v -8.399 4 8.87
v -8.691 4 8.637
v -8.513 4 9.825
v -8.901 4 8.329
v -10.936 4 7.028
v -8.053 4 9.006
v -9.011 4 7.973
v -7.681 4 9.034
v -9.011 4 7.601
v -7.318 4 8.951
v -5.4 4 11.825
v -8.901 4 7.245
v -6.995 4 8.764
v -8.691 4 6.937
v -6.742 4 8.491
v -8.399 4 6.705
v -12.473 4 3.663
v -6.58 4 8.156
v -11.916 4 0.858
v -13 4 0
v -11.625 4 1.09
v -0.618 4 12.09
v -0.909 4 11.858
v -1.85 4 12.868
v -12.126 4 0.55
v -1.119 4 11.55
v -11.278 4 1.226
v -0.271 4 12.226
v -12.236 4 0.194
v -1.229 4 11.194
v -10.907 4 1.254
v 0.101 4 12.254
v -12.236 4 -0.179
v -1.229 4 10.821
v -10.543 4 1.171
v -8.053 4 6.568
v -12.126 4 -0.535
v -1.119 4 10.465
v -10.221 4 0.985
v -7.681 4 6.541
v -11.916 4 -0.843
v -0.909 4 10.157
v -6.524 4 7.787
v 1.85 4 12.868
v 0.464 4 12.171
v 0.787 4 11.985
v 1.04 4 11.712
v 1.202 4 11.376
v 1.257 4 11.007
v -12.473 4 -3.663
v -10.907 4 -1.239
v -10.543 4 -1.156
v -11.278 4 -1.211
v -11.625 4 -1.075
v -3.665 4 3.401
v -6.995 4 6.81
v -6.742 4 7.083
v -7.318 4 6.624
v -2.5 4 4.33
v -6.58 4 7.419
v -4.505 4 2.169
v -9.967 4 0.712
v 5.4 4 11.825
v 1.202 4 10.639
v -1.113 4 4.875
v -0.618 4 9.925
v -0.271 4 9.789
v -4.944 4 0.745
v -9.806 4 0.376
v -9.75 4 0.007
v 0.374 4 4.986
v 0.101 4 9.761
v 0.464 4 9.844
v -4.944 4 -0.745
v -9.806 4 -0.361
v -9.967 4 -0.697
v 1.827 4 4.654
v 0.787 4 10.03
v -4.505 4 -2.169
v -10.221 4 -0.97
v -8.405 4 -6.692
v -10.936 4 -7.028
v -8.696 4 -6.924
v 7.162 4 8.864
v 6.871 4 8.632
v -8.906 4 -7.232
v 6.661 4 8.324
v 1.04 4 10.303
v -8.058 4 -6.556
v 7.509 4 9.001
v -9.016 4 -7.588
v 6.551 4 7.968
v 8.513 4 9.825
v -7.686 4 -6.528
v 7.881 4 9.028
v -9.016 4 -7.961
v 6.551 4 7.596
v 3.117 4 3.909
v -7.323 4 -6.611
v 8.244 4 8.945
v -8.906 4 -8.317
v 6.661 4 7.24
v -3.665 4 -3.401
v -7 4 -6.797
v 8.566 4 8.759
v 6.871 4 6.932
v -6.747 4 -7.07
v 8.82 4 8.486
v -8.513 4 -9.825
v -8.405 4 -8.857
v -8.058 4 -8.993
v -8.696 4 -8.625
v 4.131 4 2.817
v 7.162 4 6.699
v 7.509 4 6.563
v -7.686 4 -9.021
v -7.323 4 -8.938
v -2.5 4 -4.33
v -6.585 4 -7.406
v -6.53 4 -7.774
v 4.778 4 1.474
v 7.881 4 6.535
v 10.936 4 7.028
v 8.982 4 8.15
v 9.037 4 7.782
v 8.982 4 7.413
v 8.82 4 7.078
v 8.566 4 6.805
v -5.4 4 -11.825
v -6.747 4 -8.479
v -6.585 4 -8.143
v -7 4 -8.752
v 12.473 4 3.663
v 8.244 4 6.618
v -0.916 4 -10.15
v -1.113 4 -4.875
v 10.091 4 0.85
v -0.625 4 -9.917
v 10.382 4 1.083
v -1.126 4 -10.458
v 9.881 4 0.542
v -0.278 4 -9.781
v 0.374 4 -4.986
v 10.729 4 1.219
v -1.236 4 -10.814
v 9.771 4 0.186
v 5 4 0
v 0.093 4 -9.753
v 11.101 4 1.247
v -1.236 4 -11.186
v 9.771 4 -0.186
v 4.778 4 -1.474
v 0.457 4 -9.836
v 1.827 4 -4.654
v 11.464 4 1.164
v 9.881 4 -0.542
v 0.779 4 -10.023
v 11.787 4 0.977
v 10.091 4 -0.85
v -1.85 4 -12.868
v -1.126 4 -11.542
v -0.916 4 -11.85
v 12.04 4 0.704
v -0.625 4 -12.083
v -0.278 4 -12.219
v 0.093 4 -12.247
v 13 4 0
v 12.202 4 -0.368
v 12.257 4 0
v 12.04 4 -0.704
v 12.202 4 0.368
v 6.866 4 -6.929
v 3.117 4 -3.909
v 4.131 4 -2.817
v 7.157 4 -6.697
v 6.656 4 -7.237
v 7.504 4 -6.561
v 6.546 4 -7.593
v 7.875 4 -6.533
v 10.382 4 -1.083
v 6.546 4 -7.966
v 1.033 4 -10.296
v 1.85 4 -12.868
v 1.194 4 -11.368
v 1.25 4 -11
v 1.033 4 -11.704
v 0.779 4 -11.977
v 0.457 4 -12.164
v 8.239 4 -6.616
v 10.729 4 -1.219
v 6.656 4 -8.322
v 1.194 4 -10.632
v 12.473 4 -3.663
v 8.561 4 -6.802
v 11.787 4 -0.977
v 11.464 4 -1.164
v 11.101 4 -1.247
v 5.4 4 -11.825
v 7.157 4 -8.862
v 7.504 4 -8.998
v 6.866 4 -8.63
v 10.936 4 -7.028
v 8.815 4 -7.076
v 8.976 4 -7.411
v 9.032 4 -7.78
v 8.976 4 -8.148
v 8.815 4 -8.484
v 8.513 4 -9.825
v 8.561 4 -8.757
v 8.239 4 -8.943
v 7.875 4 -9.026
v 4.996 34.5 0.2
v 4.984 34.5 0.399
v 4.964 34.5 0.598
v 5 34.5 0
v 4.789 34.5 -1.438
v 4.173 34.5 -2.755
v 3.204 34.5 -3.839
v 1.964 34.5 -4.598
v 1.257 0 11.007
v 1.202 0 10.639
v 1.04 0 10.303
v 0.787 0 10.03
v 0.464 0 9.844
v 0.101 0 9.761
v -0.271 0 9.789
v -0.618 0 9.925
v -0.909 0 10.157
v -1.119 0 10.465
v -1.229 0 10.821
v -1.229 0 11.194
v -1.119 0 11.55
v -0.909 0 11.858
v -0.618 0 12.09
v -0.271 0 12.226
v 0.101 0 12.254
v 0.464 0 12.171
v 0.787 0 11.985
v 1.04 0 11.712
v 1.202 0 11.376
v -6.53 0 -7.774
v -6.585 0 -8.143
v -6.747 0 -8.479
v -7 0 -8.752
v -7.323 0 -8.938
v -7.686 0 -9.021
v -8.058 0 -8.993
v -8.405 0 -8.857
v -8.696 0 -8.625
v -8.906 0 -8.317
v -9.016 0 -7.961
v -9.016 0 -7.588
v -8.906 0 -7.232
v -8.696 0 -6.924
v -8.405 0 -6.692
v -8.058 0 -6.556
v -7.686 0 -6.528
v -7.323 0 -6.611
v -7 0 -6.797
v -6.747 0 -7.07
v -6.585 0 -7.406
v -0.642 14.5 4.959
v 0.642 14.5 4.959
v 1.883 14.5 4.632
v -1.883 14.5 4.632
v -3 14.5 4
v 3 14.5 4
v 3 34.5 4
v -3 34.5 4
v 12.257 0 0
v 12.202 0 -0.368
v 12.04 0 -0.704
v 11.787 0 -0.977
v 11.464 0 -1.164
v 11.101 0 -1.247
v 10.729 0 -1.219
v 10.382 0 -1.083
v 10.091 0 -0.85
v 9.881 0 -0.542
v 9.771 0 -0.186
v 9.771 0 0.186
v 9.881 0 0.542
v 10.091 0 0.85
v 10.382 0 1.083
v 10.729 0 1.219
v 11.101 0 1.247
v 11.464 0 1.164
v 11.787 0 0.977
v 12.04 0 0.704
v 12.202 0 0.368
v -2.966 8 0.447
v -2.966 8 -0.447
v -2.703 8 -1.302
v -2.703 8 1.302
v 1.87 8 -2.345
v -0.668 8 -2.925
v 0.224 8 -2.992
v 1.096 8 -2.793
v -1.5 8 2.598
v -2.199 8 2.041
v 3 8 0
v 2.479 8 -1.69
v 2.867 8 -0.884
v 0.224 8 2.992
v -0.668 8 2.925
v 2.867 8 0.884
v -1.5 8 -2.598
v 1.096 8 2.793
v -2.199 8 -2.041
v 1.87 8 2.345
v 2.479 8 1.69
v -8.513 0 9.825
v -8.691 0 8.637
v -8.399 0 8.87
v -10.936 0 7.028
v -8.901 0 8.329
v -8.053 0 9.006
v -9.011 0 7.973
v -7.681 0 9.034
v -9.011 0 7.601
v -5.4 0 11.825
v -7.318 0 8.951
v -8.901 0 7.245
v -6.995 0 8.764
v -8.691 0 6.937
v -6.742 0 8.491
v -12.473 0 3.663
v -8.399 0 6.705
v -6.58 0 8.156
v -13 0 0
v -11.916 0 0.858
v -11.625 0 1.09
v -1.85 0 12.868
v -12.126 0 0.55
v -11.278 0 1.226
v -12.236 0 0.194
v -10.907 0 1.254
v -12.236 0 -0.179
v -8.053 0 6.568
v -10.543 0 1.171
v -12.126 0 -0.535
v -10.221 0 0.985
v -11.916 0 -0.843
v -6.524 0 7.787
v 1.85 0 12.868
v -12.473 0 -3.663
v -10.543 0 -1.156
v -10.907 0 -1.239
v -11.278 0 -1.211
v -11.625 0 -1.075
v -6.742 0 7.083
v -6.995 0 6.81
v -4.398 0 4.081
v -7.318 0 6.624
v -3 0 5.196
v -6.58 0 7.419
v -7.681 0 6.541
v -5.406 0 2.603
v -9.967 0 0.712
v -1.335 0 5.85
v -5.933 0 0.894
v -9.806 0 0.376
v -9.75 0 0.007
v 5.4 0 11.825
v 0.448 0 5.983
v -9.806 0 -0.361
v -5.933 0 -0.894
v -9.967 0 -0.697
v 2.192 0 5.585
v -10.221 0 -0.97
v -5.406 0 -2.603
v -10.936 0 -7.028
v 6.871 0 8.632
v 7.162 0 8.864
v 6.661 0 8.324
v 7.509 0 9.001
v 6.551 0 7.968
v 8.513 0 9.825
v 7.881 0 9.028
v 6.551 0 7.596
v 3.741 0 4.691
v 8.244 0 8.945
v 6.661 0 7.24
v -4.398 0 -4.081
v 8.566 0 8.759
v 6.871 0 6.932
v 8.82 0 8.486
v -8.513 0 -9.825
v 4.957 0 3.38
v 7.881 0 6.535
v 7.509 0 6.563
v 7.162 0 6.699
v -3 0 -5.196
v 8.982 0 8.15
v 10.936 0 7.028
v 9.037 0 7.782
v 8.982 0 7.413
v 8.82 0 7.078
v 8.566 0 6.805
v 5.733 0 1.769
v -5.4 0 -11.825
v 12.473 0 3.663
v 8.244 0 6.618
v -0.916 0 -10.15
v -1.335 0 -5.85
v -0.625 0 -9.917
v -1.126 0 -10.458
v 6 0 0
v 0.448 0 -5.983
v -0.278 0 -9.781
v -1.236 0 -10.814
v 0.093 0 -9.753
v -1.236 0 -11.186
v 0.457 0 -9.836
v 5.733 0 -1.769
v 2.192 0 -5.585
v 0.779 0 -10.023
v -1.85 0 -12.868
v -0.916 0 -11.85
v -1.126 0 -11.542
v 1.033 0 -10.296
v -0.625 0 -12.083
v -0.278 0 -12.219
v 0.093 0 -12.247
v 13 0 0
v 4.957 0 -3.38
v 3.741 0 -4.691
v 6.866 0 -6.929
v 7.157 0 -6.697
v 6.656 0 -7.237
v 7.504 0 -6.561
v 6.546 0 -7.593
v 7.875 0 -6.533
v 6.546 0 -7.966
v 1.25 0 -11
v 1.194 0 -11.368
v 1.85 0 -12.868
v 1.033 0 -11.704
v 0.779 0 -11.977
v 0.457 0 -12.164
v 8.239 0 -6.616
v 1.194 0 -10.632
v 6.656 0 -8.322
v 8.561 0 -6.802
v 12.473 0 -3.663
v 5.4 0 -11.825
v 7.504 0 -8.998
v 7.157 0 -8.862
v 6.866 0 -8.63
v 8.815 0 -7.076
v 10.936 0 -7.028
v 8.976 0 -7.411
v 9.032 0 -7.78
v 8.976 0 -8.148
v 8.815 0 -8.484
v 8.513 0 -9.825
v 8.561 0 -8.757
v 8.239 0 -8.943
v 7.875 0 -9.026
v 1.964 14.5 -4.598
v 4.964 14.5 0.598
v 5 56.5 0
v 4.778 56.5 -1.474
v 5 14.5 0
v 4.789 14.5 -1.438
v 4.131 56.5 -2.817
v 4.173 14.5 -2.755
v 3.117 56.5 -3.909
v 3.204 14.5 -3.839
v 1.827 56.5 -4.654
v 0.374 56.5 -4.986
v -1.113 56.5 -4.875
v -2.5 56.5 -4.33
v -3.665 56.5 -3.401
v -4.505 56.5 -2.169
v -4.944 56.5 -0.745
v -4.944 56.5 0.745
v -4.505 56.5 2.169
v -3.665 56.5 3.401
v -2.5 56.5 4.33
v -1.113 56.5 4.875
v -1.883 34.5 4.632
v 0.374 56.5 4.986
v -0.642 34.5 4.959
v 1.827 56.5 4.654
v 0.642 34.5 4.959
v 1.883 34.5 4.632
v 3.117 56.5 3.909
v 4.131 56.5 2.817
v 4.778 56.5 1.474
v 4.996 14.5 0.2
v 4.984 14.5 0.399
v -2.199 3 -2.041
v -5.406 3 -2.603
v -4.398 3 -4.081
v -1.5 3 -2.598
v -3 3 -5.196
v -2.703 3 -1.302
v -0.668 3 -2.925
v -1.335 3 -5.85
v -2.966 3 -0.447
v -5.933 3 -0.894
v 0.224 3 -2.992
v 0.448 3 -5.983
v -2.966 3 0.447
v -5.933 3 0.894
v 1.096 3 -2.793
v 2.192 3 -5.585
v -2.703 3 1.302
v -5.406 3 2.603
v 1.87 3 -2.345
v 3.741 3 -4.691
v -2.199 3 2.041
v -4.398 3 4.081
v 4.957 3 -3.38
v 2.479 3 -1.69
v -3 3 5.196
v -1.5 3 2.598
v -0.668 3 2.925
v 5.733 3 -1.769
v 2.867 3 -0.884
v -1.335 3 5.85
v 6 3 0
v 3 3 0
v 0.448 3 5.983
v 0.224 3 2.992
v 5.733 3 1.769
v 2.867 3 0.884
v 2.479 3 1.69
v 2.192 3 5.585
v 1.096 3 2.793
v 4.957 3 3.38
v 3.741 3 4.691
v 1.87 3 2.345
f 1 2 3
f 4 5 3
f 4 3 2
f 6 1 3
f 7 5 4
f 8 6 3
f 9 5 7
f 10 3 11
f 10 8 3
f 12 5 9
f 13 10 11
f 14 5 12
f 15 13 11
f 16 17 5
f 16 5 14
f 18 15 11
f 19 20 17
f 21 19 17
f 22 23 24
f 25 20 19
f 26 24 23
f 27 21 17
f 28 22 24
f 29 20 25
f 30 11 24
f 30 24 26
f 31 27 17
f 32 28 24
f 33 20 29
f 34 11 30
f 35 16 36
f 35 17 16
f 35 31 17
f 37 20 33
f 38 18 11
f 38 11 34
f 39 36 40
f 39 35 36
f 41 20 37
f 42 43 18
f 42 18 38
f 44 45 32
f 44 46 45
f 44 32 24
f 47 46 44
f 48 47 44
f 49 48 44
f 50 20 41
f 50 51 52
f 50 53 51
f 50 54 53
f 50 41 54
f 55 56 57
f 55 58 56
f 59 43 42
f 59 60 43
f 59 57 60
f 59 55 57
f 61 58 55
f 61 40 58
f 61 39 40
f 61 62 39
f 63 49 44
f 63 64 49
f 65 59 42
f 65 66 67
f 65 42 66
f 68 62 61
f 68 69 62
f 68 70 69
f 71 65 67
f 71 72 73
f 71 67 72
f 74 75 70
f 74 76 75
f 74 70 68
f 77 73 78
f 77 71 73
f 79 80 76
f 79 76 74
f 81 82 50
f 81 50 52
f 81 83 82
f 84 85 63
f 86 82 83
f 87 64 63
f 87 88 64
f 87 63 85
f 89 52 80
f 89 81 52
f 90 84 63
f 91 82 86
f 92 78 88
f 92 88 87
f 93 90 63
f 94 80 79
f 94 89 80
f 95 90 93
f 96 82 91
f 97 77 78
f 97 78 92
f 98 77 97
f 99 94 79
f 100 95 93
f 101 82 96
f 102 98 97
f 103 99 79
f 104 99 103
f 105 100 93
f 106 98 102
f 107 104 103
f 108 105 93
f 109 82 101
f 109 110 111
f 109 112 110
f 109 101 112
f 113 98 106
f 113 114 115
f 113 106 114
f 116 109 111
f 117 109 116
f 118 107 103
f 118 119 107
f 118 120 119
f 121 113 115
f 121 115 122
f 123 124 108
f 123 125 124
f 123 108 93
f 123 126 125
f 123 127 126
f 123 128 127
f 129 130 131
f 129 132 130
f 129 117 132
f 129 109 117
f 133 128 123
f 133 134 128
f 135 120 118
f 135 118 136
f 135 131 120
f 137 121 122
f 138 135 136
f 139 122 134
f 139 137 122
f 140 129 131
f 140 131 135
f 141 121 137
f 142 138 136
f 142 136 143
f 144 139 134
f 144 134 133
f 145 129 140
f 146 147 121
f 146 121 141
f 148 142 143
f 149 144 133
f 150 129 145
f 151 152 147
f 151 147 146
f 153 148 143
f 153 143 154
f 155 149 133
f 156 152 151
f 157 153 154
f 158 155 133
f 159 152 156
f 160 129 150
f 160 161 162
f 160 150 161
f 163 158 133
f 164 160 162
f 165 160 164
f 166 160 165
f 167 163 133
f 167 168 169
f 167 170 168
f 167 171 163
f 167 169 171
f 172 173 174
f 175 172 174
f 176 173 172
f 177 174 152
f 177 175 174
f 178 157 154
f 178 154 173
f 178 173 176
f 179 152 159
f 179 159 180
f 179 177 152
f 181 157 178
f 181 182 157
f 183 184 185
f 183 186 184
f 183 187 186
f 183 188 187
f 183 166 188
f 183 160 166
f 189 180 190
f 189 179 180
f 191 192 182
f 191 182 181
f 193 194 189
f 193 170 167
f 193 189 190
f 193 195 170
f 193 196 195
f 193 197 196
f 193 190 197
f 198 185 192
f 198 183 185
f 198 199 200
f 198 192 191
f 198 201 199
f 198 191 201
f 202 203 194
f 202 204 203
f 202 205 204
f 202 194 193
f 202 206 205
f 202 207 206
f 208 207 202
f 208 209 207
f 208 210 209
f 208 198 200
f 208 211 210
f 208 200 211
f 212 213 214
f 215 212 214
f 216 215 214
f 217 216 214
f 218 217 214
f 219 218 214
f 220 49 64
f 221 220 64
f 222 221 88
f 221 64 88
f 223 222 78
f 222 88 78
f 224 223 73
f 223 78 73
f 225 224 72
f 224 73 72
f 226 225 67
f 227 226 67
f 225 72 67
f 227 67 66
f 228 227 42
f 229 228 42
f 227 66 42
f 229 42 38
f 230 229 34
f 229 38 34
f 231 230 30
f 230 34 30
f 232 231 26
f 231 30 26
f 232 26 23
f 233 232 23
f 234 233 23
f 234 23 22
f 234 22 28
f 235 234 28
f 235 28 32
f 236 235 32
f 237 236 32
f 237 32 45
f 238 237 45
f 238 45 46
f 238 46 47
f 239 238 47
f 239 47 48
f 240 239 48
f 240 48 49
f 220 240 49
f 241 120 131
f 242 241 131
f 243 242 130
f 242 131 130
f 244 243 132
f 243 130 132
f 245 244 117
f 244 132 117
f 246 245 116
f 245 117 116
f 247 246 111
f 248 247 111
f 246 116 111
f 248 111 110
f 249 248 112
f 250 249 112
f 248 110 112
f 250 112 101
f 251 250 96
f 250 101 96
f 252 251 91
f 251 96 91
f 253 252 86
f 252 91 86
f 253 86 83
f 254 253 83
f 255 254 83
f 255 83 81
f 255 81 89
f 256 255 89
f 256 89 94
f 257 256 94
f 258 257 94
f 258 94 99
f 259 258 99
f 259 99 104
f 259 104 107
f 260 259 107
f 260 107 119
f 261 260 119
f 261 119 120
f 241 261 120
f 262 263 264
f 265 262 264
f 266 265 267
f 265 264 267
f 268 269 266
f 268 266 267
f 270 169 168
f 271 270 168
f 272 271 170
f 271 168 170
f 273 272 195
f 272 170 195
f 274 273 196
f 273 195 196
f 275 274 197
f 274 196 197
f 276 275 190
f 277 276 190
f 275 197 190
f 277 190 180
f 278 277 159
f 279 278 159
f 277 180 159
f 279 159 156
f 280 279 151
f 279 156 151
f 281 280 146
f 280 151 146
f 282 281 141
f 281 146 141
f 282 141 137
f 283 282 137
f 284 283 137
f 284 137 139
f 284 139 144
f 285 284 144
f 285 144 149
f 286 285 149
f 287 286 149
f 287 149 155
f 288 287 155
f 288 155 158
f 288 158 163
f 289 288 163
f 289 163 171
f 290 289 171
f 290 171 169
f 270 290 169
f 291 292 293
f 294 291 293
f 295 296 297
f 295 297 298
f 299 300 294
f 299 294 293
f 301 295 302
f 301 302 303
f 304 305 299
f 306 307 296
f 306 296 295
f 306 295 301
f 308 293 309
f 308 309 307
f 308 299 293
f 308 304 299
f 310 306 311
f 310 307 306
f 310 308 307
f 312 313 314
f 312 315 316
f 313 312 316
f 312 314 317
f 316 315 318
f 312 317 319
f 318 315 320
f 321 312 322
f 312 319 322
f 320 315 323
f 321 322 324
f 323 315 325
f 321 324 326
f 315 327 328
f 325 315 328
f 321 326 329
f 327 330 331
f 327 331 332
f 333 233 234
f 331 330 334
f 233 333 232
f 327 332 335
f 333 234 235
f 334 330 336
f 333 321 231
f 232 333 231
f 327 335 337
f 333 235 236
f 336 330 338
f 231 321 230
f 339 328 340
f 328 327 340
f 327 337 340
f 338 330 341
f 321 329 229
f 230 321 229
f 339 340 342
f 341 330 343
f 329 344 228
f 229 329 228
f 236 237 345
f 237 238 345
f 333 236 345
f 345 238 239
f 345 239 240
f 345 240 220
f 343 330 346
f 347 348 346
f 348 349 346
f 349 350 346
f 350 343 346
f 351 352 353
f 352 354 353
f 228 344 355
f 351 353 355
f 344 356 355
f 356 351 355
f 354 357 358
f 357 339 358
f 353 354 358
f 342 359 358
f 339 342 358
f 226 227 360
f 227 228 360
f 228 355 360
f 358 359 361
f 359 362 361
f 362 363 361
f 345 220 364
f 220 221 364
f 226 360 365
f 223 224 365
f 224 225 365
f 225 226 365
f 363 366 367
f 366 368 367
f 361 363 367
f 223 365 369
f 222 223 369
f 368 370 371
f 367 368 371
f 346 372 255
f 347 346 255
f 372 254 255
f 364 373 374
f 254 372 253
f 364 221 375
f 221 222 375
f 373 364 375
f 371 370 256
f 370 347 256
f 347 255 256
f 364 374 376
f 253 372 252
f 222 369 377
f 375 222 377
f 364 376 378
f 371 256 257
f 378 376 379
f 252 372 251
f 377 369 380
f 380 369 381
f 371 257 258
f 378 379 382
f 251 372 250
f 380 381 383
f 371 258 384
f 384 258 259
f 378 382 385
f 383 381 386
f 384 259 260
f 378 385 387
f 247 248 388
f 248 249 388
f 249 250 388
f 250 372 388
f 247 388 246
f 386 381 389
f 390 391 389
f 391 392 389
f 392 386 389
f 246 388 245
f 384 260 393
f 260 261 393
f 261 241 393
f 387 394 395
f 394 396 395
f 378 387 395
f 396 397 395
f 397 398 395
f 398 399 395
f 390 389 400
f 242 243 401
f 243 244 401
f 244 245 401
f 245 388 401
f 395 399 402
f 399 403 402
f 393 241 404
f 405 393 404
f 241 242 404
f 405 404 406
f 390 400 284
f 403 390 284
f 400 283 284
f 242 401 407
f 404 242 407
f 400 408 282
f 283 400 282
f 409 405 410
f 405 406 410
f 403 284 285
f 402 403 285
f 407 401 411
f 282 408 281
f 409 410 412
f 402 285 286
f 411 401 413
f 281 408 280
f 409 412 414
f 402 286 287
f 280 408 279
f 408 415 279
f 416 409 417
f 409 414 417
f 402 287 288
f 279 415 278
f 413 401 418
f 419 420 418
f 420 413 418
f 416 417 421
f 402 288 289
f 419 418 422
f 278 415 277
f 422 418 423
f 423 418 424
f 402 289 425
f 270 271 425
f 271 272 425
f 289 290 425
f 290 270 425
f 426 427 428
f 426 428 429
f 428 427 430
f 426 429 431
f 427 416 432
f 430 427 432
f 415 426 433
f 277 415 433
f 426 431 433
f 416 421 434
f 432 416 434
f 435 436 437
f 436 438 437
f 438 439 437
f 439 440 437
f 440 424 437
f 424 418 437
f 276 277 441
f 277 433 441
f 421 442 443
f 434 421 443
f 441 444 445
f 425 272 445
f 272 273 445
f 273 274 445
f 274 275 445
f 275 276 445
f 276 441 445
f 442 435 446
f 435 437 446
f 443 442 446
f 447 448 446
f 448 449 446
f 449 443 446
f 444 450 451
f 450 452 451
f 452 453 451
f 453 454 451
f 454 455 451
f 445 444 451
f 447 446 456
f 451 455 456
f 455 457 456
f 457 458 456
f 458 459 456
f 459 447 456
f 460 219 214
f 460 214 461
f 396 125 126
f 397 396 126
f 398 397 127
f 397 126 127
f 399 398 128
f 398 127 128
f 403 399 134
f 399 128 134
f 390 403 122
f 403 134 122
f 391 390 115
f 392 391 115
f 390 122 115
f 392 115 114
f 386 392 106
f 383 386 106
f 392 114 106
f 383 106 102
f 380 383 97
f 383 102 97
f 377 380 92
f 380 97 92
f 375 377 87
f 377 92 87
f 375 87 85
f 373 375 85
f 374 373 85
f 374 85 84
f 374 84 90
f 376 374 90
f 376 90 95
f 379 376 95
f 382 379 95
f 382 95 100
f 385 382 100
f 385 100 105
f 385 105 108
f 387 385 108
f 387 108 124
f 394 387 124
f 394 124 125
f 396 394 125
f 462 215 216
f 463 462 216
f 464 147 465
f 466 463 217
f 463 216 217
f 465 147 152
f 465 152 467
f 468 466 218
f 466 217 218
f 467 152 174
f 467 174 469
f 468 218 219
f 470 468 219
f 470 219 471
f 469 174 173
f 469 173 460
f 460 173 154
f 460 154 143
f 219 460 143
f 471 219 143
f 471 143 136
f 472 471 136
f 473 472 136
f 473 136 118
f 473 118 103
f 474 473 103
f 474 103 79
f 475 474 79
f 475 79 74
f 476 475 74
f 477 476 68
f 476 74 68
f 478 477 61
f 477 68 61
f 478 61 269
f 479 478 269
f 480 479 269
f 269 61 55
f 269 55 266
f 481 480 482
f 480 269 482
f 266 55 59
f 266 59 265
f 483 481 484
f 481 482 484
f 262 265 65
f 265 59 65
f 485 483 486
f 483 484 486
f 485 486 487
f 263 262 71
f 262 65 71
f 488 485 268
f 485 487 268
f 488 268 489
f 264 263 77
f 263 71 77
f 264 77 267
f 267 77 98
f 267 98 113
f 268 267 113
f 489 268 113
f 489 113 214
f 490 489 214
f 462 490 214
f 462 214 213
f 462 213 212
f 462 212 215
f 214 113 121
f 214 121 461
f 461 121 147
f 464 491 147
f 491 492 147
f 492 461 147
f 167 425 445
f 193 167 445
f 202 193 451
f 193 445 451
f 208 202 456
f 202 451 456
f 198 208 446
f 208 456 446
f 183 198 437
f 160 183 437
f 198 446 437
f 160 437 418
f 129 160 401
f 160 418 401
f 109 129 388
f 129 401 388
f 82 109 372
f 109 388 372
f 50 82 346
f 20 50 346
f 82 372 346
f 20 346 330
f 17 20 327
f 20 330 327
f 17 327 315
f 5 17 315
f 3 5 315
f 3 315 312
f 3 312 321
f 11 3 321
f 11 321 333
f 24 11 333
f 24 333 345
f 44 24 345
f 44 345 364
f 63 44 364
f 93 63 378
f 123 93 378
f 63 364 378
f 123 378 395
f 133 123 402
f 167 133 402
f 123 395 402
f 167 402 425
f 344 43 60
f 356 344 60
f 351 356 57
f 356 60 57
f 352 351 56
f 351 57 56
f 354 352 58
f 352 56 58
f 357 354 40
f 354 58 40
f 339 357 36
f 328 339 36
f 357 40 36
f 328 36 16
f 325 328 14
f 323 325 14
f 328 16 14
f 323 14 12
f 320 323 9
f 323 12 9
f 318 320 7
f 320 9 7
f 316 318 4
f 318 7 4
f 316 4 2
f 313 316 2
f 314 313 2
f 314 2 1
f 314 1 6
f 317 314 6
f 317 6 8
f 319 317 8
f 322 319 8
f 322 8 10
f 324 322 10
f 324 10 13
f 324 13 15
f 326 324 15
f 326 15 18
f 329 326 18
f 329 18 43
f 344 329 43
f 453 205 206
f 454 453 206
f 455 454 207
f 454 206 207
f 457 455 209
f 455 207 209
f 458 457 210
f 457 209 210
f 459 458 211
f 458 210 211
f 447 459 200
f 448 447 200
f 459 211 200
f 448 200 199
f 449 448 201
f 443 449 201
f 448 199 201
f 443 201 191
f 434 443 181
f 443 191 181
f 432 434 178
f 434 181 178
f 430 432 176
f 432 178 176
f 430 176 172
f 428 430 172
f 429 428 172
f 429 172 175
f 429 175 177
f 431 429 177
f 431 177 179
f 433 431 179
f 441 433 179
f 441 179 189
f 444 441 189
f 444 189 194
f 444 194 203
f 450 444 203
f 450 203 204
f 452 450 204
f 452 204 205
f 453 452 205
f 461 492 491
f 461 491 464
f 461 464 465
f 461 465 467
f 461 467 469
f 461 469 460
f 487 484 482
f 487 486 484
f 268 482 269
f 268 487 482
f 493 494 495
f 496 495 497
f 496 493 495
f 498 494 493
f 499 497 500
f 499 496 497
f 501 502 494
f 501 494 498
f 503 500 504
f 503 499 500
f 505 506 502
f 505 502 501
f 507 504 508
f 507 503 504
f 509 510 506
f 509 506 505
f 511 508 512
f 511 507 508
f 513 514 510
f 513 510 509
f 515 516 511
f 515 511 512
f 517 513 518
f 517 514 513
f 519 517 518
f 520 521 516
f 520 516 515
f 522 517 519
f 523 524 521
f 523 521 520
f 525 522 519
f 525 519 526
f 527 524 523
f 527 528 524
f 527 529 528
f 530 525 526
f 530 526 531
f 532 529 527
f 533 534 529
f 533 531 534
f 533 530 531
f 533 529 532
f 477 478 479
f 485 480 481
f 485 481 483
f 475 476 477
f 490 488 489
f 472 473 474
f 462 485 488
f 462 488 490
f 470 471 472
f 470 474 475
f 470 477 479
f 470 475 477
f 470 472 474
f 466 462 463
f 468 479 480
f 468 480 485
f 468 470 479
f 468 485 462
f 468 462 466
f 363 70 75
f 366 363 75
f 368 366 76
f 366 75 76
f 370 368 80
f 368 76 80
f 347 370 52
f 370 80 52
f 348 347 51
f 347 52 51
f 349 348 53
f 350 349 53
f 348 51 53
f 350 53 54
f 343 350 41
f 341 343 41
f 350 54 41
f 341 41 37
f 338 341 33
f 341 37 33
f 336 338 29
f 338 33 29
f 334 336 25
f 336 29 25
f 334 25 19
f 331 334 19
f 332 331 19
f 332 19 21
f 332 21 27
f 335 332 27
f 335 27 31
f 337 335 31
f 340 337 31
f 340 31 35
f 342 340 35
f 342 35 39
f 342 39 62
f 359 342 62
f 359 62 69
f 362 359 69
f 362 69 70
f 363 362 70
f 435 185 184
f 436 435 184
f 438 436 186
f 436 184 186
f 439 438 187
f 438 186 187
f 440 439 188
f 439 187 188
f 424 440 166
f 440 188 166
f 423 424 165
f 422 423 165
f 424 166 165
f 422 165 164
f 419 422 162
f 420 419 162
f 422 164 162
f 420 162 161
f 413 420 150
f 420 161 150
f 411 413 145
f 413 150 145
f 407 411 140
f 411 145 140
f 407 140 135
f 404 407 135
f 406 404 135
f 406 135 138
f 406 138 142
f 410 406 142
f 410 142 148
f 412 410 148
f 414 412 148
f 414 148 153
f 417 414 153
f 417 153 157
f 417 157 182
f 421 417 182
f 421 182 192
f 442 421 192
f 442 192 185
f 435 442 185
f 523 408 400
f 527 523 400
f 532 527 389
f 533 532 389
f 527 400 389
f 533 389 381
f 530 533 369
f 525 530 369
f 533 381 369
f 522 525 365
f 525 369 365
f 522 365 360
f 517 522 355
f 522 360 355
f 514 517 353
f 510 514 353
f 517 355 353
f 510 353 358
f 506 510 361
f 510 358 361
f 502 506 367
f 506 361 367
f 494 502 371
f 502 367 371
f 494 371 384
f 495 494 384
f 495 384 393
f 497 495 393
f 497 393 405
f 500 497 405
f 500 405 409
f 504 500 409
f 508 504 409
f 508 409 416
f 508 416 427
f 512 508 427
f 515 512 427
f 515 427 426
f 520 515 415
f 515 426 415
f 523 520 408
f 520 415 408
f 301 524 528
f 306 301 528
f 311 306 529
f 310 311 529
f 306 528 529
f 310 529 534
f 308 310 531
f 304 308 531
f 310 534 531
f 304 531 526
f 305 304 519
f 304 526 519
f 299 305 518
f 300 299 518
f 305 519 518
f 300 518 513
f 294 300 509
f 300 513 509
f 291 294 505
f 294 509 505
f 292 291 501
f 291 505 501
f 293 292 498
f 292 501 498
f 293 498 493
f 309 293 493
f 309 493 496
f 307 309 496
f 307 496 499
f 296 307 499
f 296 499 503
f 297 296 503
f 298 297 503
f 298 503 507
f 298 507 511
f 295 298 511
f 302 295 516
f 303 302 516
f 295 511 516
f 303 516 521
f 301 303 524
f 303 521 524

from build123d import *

# Parameters (mm, degrees)
SKETCH_1_R          = 13
EXTRUDE_1_DEPTH     = 4
SKETCH_2_R          = 5
EXTRUDE_2_DEPTH     = 52.5
CUT_EXTRUDE_1_REACH = 6
SKETCH_3_R          = 1.25
SKETCH_4_W          = 6
SKETCH_4_H          = 20
CUT_EXTRUDE_2_DEPTH = 1
SKETCH_5_W          = 20
SKETCH_5_H          = 6
CUT_EXTRUDE_3_DEPTH = 1
SKETCH_6_R          = 6
CUT_EXTRUDE_5_DEPTH = 3
SKETCH_7_R          = 3
CUT_EXTRUDE_6_DEPTH = 5


with BuildPart() as part:
    # 스케치1 → 보스-돌출1 (new body)
    with BuildSketch(Plane(origin=(0, 0, 0), x_dir=(1, 0, 0), z_dir=(0, 1, 0))):
        Circle(SKETCH_1_R)
    extrude(amount=EXTRUDE_1_DEPTH)

    # 스케치2 → 보스-돌출2 (add)
    with BuildSketch(Plane(origin=(0, 4, 0), x_dir=(1, 0, 0), z_dir=(0, 1, 0))):
        Circle(SKETCH_2_R)
    extrude(amount=EXTRUDE_2_DEPTH)

    # 스케치3 → 컷-돌출1 (cut, up to next)
    with BuildSketch(Plane(origin=(0, 4, 0), x_dir=(1, 0, 0), z_dir=(0, 1, 0)), mode=Mode.PRIVATE) as cut_extrude_1_sk1:
        with Locations((0, 11)):
            Circle(SKETCH_3_R)
    cut_extrude_1_tool1 = extrude(cut_extrude_1_sk1.sketch, amount=-CUT_EXTRUDE_1_REACH, mode=Mode.PRIVATE) & part.part
    add(cut_extrude_1_tool1.solids().sort_by_distance((0, 4, -11))[0], mode=Mode.SUBTRACT)
    # 스케치3 → 컷-돌출1 (cut, up to next)
    with BuildSketch(Plane(origin=(0, 4, 0), x_dir=(1, 0, 0), z_dir=(0, 1, 0)), mode=Mode.PRIVATE) as cut_extrude_1_sk2:
        with Locations((7.781876099, 7.779707807)):
            Circle(SKETCH_3_R)
    cut_extrude_1_tool2 = extrude(cut_extrude_1_sk2.sketch, amount=-CUT_EXTRUDE_1_REACH, mode=Mode.PRIVATE) & part.part
    add(cut_extrude_1_tool2.solids().sort_by_distance((7.781876, 4, -7.779708))[0], mode=Mode.SUBTRACT)
    # 스케치3 → 컷-돌출1 (cut, up to next)
    with BuildSketch(Plane(origin=(0, 4, 0), x_dir=(1, 0, 0), z_dir=(0, 1, 0)), mode=Mode.PRIVATE) as cut_extrude_1_sk3:
        with Locations((11.007403012, 0)):
            Circle(SKETCH_3_R)
    cut_extrude_1_tool3 = extrude(cut_extrude_1_sk3.sketch, amount=-CUT_EXTRUDE_1_REACH, mode=Mode.PRIVATE) & part.part
    add(cut_extrude_1_tool3.solids().sort_by_distance((11.007403, 4, 0))[0], mode=Mode.SUBTRACT)
    # 스케치3 → 컷-돌출1 (cut, up to next)
    with BuildSketch(Plane(origin=(0, 4, 0), x_dir=(1, 0, 0), z_dir=(0, 1, 0)), mode=Mode.PRIVATE) as cut_extrude_1_sk4:
        with Locations((7.787110819, -7.781876099)):
            Circle(SKETCH_3_R)
    cut_extrude_1_tool4 = extrude(cut_extrude_1_sk4.sketch, amount=-CUT_EXTRUDE_1_REACH, mode=Mode.PRIVATE) & part.part
    add(cut_extrude_1_tool4.solids().sort_by_distance((7.787111, 4, 7.781876))[0], mode=Mode.SUBTRACT)
    # 스케치3 → 컷-돌출1 (cut, up to next)
    with BuildSketch(Plane(origin=(0, 4, 0), x_dir=(1, 0, 0), z_dir=(0, 1, 0)), mode=Mode.PRIVATE) as cut_extrude_1_sk5:
        with Locations((0.007403012, -11.007403012)):
            Circle(SKETCH_3_R)
    cut_extrude_1_tool5 = extrude(cut_extrude_1_sk5.sketch, amount=-CUT_EXTRUDE_1_REACH, mode=Mode.PRIVATE) & part.part
    add(cut_extrude_1_tool5.solids().sort_by_distance((0.007403, 4, 11.007403))[0], mode=Mode.SUBTRACT)
    # 스케치3 → 컷-돌출1 (cut, up to next)
    with BuildSketch(Plane(origin=(0, 4, 0), x_dir=(1, 0, 0), z_dir=(0, 1, 0)), mode=Mode.PRIVATE) as cut_extrude_1_sk6:
        with Locations((-7.774473087, -7.787110819)):
            Circle(SKETCH_3_R)
    cut_extrude_1_tool6 = extrude(cut_extrude_1_sk6.sketch, amount=-CUT_EXTRUDE_1_REACH, mode=Mode.PRIVATE) & part.part
    add(cut_extrude_1_tool6.solids().sort_by_distance((-7.774473, 4, 7.787111))[0], mode=Mode.SUBTRACT)
    # 스케치3 → 컷-돌출1 (cut, up to next)
    with BuildSketch(Plane(origin=(0, 4, 0), x_dir=(1, 0, 0), z_dir=(0, 1, 0)), mode=Mode.PRIVATE) as cut_extrude_1_sk7:
        with Locations((-11, -0.007403012)):
            Circle(SKETCH_3_R)
    cut_extrude_1_tool7 = extrude(cut_extrude_1_sk7.sketch, amount=-CUT_EXTRUDE_1_REACH, mode=Mode.PRIVATE) & part.part
    add(cut_extrude_1_tool7.solids().sort_by_distance((-11, 4, 0.007403))[0], mode=Mode.SUBTRACT)
    # 스케치3 → 컷-돌출1 (cut, up to next)
    with BuildSketch(Plane(origin=(0, 4, 0), x_dir=(1, 0, 0), z_dir=(0, 1, 0)), mode=Mode.PRIVATE) as cut_extrude_1_sk8:
        with Locations((-7.779707807, 7.774473087)):
            Circle(SKETCH_3_R)
    cut_extrude_1_tool8 = extrude(cut_extrude_1_sk8.sketch, amount=-CUT_EXTRUDE_1_REACH, mode=Mode.PRIVATE) & part.part
    add(cut_extrude_1_tool8.solids().sort_by_distance((-7.779708, 4, -7.774473))[0], mode=Mode.SUBTRACT)

    # 스케치4 → 컷-돌출2 (cut)
    with BuildSketch(Plane.XY.offset(5)):
        with Locations((0, 24.5)):
            Rectangle(SKETCH_4_W, SKETCH_4_H)
    extrude(amount=-CUT_EXTRUDE_2_DEPTH, mode=Mode.SUBTRACT)

    # 스케치5 → 컷-돌출3 (cut)
    with BuildSketch(Plane(origin=(4.330127019, 0, -2.5), x_dir=(0, -1, 0), z_dir=(0.866025404, 0, -0.5))):
        with Locations((-24.5, 0)):
            Rectangle(SKETCH_5_W, SKETCH_5_H)
    extrude(amount=-CUT_EXTRUDE_3_DEPTH, mode=Mode.SUBTRACT)

    # 스케치6 → 컷-돌출5 (cut)
    with BuildSketch(Plane.XZ):
        Circle(SKETCH_6_R)
    extrude(amount=-CUT_EXTRUDE_5_DEPTH, mode=Mode.SUBTRACT)

    # 스케치7 → 컷-돌출6 (cut)
    with BuildSketch(Plane.XZ.offset(-3)):
        Circle(SKETCH_7_R)
    extrude(amount=-CUT_EXTRUDE_6_DEPTH, mode=Mode.SUBTRACT)


solid = part.part
